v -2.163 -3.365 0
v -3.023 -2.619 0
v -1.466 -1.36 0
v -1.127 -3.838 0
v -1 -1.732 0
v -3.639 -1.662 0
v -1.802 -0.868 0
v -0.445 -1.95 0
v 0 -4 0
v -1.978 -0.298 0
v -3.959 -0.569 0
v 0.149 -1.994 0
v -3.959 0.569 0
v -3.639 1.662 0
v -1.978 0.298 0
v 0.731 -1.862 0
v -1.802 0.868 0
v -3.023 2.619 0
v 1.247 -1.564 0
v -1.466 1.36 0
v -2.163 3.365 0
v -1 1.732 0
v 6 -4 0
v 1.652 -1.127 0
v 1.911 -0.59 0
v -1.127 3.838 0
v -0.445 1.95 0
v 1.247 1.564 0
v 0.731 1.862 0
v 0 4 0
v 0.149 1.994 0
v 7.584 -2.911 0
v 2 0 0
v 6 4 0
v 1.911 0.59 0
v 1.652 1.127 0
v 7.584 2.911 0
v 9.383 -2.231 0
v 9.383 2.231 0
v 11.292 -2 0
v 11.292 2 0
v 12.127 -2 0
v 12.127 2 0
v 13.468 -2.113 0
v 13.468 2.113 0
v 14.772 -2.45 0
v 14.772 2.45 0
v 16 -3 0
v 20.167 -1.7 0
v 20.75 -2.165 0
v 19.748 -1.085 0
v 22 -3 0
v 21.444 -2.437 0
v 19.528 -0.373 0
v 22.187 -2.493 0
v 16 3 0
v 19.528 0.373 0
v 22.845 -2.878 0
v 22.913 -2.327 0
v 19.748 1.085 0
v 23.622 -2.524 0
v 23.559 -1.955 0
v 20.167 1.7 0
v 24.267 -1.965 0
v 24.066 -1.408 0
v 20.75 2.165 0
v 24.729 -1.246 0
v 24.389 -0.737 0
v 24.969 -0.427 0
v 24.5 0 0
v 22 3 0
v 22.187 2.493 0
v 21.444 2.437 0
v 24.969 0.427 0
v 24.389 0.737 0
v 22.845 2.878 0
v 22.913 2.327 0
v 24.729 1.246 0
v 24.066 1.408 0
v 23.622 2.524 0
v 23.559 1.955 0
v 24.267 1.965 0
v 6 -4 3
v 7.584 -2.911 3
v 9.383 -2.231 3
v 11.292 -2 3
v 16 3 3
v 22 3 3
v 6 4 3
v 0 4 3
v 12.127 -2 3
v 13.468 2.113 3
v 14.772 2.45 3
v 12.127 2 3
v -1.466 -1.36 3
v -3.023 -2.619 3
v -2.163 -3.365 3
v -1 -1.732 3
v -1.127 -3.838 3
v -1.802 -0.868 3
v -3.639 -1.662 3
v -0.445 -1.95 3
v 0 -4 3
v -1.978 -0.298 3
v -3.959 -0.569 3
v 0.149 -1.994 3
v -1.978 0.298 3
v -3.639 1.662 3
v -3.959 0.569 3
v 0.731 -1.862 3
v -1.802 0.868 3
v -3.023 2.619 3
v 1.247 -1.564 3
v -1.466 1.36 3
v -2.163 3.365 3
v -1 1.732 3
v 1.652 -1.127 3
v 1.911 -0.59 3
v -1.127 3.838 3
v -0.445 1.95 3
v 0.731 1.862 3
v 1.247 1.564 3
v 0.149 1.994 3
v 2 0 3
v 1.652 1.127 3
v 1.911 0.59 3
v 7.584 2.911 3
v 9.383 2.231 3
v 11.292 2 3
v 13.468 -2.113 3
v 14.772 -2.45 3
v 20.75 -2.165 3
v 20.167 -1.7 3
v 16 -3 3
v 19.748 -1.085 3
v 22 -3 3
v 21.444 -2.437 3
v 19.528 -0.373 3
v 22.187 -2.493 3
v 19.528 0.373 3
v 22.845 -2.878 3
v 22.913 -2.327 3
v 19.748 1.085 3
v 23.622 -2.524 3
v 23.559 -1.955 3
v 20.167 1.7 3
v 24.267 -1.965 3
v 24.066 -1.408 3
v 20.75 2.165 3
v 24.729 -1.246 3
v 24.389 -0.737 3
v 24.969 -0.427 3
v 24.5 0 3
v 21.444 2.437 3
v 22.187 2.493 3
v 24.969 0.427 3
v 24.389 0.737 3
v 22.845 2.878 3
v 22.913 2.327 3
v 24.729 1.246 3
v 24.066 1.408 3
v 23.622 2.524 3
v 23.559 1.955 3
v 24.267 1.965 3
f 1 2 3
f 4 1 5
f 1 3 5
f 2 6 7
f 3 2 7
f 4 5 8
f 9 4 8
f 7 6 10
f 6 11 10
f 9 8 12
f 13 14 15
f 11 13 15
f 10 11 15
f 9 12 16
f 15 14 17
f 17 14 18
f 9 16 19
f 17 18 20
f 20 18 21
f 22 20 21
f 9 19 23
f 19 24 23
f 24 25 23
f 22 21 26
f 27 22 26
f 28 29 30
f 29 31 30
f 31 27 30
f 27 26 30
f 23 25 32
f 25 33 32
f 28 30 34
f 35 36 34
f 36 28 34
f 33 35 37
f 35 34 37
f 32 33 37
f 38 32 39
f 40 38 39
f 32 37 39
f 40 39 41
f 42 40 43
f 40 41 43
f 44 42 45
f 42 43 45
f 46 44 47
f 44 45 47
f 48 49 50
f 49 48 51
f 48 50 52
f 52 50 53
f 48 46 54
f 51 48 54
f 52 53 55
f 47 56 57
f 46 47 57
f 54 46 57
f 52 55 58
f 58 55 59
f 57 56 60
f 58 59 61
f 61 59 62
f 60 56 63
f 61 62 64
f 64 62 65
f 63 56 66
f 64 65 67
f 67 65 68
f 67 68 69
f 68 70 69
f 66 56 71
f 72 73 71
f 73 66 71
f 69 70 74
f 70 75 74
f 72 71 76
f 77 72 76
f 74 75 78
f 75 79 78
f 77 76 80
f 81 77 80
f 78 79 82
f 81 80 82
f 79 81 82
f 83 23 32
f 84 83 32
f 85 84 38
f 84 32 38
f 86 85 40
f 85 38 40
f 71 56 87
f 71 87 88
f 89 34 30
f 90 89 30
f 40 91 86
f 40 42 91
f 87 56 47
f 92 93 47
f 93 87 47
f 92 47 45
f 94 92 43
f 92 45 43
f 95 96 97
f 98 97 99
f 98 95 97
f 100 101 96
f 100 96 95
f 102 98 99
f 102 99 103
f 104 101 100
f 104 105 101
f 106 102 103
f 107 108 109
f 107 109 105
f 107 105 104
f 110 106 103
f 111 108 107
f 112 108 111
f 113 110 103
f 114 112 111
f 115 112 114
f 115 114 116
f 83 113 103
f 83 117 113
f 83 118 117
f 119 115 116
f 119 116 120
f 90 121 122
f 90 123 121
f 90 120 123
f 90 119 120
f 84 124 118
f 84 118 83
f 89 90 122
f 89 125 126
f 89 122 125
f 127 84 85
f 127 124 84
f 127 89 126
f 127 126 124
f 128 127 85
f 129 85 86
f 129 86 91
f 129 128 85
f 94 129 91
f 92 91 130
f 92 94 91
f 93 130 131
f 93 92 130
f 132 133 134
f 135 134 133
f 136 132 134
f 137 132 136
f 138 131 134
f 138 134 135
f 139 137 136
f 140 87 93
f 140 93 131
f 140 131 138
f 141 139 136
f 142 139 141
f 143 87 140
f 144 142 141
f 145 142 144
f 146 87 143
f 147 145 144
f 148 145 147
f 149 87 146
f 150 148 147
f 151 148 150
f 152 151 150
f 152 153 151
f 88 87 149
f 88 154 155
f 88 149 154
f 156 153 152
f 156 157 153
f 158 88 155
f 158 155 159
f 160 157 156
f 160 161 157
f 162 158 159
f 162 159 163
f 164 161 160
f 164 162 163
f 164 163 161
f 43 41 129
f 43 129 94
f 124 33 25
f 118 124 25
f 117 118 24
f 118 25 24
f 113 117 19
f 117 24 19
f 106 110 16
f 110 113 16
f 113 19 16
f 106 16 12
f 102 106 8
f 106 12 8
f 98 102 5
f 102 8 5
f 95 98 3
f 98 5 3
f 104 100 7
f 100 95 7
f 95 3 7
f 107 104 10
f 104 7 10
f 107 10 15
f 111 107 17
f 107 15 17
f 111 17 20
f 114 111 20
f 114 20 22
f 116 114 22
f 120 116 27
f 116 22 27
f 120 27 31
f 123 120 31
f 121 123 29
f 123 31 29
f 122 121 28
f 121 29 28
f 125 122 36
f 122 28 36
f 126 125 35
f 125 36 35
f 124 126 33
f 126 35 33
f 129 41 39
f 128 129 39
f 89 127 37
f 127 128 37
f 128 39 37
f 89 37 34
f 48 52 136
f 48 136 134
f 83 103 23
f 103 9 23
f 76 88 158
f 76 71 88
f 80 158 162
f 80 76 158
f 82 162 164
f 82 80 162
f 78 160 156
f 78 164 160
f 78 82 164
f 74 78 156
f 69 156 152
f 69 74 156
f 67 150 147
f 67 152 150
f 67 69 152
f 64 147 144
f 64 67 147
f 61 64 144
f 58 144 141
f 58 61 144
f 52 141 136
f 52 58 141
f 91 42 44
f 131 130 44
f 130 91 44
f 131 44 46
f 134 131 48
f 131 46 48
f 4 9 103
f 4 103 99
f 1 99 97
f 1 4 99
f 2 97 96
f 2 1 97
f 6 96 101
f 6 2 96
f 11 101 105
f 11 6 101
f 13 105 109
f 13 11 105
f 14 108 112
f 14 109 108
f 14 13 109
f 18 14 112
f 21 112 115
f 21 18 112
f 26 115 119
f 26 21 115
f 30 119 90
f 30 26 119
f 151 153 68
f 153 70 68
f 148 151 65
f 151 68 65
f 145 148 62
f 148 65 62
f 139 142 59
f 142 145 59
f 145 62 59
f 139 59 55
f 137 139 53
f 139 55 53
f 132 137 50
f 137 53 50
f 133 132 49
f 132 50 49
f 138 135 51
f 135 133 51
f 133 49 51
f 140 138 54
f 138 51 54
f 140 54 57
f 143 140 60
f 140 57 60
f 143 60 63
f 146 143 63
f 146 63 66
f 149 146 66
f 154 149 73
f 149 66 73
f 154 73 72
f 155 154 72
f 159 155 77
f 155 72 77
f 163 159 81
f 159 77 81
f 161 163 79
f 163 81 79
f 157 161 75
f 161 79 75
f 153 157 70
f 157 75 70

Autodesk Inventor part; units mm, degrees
ref_plane "YZ Plane" through (0, 0, 0) normal (1, 0, 0) x (0, 1, 0)
ref_plane "XZ Plane" through (0, 0, 0) normal (0, 1, 0) x (-1, 0, 0)
ref_plane "XY Plane" through (0, 0, 0) normal (0, 0, 1) x (1, 0, 0)
sketch "Sketch1" plane through (0, 0, 0) normal (0, 0, 1) x (1, 0, 0)
  circle A0 centre (0, 0) radius 4
  circle A1 centre (0, 0) radius 2
  line L0 (0, -4) -> (6, -4)
  line L1 (6, -4) -> (6, 4)
  line L2 (6, 4) -> (0, 4)
  circle A2 centre (22, 0) radius 2.5
  circle A3 centre (22, 0) radius 3
  line L3 (22, -3) -> (16, -3)
  line L4 (16, -3) -> (16, 3)
  line L5 (16, 3) -> (22, 3)
  line L6 (16, -2) -> (6, -2)
  line L7 (6, 2) -> (16, 2)
  dimension "d0" = 8
  dimension "d1" = 4
  dimension "d8" = 6
  dimension "d9" = 5
  dimension "d10" = 6
  dimension "d11" = 6
  dimension "d12" = 6
  dimension "d17" = 10
  dimension "d19" = 4
extrude "Extrusion1" add sketch "Sketch1" along normal blind 3
fillet "Fillet1" radius 8 1 edges at (6, -2, 1.5)
fillet "Fillet2" radius 8 3 edges at (6, 2, 1.5) (16, 2, 1.5) (16, -2, 1.5)
properties part number "PLEUEL short new"
